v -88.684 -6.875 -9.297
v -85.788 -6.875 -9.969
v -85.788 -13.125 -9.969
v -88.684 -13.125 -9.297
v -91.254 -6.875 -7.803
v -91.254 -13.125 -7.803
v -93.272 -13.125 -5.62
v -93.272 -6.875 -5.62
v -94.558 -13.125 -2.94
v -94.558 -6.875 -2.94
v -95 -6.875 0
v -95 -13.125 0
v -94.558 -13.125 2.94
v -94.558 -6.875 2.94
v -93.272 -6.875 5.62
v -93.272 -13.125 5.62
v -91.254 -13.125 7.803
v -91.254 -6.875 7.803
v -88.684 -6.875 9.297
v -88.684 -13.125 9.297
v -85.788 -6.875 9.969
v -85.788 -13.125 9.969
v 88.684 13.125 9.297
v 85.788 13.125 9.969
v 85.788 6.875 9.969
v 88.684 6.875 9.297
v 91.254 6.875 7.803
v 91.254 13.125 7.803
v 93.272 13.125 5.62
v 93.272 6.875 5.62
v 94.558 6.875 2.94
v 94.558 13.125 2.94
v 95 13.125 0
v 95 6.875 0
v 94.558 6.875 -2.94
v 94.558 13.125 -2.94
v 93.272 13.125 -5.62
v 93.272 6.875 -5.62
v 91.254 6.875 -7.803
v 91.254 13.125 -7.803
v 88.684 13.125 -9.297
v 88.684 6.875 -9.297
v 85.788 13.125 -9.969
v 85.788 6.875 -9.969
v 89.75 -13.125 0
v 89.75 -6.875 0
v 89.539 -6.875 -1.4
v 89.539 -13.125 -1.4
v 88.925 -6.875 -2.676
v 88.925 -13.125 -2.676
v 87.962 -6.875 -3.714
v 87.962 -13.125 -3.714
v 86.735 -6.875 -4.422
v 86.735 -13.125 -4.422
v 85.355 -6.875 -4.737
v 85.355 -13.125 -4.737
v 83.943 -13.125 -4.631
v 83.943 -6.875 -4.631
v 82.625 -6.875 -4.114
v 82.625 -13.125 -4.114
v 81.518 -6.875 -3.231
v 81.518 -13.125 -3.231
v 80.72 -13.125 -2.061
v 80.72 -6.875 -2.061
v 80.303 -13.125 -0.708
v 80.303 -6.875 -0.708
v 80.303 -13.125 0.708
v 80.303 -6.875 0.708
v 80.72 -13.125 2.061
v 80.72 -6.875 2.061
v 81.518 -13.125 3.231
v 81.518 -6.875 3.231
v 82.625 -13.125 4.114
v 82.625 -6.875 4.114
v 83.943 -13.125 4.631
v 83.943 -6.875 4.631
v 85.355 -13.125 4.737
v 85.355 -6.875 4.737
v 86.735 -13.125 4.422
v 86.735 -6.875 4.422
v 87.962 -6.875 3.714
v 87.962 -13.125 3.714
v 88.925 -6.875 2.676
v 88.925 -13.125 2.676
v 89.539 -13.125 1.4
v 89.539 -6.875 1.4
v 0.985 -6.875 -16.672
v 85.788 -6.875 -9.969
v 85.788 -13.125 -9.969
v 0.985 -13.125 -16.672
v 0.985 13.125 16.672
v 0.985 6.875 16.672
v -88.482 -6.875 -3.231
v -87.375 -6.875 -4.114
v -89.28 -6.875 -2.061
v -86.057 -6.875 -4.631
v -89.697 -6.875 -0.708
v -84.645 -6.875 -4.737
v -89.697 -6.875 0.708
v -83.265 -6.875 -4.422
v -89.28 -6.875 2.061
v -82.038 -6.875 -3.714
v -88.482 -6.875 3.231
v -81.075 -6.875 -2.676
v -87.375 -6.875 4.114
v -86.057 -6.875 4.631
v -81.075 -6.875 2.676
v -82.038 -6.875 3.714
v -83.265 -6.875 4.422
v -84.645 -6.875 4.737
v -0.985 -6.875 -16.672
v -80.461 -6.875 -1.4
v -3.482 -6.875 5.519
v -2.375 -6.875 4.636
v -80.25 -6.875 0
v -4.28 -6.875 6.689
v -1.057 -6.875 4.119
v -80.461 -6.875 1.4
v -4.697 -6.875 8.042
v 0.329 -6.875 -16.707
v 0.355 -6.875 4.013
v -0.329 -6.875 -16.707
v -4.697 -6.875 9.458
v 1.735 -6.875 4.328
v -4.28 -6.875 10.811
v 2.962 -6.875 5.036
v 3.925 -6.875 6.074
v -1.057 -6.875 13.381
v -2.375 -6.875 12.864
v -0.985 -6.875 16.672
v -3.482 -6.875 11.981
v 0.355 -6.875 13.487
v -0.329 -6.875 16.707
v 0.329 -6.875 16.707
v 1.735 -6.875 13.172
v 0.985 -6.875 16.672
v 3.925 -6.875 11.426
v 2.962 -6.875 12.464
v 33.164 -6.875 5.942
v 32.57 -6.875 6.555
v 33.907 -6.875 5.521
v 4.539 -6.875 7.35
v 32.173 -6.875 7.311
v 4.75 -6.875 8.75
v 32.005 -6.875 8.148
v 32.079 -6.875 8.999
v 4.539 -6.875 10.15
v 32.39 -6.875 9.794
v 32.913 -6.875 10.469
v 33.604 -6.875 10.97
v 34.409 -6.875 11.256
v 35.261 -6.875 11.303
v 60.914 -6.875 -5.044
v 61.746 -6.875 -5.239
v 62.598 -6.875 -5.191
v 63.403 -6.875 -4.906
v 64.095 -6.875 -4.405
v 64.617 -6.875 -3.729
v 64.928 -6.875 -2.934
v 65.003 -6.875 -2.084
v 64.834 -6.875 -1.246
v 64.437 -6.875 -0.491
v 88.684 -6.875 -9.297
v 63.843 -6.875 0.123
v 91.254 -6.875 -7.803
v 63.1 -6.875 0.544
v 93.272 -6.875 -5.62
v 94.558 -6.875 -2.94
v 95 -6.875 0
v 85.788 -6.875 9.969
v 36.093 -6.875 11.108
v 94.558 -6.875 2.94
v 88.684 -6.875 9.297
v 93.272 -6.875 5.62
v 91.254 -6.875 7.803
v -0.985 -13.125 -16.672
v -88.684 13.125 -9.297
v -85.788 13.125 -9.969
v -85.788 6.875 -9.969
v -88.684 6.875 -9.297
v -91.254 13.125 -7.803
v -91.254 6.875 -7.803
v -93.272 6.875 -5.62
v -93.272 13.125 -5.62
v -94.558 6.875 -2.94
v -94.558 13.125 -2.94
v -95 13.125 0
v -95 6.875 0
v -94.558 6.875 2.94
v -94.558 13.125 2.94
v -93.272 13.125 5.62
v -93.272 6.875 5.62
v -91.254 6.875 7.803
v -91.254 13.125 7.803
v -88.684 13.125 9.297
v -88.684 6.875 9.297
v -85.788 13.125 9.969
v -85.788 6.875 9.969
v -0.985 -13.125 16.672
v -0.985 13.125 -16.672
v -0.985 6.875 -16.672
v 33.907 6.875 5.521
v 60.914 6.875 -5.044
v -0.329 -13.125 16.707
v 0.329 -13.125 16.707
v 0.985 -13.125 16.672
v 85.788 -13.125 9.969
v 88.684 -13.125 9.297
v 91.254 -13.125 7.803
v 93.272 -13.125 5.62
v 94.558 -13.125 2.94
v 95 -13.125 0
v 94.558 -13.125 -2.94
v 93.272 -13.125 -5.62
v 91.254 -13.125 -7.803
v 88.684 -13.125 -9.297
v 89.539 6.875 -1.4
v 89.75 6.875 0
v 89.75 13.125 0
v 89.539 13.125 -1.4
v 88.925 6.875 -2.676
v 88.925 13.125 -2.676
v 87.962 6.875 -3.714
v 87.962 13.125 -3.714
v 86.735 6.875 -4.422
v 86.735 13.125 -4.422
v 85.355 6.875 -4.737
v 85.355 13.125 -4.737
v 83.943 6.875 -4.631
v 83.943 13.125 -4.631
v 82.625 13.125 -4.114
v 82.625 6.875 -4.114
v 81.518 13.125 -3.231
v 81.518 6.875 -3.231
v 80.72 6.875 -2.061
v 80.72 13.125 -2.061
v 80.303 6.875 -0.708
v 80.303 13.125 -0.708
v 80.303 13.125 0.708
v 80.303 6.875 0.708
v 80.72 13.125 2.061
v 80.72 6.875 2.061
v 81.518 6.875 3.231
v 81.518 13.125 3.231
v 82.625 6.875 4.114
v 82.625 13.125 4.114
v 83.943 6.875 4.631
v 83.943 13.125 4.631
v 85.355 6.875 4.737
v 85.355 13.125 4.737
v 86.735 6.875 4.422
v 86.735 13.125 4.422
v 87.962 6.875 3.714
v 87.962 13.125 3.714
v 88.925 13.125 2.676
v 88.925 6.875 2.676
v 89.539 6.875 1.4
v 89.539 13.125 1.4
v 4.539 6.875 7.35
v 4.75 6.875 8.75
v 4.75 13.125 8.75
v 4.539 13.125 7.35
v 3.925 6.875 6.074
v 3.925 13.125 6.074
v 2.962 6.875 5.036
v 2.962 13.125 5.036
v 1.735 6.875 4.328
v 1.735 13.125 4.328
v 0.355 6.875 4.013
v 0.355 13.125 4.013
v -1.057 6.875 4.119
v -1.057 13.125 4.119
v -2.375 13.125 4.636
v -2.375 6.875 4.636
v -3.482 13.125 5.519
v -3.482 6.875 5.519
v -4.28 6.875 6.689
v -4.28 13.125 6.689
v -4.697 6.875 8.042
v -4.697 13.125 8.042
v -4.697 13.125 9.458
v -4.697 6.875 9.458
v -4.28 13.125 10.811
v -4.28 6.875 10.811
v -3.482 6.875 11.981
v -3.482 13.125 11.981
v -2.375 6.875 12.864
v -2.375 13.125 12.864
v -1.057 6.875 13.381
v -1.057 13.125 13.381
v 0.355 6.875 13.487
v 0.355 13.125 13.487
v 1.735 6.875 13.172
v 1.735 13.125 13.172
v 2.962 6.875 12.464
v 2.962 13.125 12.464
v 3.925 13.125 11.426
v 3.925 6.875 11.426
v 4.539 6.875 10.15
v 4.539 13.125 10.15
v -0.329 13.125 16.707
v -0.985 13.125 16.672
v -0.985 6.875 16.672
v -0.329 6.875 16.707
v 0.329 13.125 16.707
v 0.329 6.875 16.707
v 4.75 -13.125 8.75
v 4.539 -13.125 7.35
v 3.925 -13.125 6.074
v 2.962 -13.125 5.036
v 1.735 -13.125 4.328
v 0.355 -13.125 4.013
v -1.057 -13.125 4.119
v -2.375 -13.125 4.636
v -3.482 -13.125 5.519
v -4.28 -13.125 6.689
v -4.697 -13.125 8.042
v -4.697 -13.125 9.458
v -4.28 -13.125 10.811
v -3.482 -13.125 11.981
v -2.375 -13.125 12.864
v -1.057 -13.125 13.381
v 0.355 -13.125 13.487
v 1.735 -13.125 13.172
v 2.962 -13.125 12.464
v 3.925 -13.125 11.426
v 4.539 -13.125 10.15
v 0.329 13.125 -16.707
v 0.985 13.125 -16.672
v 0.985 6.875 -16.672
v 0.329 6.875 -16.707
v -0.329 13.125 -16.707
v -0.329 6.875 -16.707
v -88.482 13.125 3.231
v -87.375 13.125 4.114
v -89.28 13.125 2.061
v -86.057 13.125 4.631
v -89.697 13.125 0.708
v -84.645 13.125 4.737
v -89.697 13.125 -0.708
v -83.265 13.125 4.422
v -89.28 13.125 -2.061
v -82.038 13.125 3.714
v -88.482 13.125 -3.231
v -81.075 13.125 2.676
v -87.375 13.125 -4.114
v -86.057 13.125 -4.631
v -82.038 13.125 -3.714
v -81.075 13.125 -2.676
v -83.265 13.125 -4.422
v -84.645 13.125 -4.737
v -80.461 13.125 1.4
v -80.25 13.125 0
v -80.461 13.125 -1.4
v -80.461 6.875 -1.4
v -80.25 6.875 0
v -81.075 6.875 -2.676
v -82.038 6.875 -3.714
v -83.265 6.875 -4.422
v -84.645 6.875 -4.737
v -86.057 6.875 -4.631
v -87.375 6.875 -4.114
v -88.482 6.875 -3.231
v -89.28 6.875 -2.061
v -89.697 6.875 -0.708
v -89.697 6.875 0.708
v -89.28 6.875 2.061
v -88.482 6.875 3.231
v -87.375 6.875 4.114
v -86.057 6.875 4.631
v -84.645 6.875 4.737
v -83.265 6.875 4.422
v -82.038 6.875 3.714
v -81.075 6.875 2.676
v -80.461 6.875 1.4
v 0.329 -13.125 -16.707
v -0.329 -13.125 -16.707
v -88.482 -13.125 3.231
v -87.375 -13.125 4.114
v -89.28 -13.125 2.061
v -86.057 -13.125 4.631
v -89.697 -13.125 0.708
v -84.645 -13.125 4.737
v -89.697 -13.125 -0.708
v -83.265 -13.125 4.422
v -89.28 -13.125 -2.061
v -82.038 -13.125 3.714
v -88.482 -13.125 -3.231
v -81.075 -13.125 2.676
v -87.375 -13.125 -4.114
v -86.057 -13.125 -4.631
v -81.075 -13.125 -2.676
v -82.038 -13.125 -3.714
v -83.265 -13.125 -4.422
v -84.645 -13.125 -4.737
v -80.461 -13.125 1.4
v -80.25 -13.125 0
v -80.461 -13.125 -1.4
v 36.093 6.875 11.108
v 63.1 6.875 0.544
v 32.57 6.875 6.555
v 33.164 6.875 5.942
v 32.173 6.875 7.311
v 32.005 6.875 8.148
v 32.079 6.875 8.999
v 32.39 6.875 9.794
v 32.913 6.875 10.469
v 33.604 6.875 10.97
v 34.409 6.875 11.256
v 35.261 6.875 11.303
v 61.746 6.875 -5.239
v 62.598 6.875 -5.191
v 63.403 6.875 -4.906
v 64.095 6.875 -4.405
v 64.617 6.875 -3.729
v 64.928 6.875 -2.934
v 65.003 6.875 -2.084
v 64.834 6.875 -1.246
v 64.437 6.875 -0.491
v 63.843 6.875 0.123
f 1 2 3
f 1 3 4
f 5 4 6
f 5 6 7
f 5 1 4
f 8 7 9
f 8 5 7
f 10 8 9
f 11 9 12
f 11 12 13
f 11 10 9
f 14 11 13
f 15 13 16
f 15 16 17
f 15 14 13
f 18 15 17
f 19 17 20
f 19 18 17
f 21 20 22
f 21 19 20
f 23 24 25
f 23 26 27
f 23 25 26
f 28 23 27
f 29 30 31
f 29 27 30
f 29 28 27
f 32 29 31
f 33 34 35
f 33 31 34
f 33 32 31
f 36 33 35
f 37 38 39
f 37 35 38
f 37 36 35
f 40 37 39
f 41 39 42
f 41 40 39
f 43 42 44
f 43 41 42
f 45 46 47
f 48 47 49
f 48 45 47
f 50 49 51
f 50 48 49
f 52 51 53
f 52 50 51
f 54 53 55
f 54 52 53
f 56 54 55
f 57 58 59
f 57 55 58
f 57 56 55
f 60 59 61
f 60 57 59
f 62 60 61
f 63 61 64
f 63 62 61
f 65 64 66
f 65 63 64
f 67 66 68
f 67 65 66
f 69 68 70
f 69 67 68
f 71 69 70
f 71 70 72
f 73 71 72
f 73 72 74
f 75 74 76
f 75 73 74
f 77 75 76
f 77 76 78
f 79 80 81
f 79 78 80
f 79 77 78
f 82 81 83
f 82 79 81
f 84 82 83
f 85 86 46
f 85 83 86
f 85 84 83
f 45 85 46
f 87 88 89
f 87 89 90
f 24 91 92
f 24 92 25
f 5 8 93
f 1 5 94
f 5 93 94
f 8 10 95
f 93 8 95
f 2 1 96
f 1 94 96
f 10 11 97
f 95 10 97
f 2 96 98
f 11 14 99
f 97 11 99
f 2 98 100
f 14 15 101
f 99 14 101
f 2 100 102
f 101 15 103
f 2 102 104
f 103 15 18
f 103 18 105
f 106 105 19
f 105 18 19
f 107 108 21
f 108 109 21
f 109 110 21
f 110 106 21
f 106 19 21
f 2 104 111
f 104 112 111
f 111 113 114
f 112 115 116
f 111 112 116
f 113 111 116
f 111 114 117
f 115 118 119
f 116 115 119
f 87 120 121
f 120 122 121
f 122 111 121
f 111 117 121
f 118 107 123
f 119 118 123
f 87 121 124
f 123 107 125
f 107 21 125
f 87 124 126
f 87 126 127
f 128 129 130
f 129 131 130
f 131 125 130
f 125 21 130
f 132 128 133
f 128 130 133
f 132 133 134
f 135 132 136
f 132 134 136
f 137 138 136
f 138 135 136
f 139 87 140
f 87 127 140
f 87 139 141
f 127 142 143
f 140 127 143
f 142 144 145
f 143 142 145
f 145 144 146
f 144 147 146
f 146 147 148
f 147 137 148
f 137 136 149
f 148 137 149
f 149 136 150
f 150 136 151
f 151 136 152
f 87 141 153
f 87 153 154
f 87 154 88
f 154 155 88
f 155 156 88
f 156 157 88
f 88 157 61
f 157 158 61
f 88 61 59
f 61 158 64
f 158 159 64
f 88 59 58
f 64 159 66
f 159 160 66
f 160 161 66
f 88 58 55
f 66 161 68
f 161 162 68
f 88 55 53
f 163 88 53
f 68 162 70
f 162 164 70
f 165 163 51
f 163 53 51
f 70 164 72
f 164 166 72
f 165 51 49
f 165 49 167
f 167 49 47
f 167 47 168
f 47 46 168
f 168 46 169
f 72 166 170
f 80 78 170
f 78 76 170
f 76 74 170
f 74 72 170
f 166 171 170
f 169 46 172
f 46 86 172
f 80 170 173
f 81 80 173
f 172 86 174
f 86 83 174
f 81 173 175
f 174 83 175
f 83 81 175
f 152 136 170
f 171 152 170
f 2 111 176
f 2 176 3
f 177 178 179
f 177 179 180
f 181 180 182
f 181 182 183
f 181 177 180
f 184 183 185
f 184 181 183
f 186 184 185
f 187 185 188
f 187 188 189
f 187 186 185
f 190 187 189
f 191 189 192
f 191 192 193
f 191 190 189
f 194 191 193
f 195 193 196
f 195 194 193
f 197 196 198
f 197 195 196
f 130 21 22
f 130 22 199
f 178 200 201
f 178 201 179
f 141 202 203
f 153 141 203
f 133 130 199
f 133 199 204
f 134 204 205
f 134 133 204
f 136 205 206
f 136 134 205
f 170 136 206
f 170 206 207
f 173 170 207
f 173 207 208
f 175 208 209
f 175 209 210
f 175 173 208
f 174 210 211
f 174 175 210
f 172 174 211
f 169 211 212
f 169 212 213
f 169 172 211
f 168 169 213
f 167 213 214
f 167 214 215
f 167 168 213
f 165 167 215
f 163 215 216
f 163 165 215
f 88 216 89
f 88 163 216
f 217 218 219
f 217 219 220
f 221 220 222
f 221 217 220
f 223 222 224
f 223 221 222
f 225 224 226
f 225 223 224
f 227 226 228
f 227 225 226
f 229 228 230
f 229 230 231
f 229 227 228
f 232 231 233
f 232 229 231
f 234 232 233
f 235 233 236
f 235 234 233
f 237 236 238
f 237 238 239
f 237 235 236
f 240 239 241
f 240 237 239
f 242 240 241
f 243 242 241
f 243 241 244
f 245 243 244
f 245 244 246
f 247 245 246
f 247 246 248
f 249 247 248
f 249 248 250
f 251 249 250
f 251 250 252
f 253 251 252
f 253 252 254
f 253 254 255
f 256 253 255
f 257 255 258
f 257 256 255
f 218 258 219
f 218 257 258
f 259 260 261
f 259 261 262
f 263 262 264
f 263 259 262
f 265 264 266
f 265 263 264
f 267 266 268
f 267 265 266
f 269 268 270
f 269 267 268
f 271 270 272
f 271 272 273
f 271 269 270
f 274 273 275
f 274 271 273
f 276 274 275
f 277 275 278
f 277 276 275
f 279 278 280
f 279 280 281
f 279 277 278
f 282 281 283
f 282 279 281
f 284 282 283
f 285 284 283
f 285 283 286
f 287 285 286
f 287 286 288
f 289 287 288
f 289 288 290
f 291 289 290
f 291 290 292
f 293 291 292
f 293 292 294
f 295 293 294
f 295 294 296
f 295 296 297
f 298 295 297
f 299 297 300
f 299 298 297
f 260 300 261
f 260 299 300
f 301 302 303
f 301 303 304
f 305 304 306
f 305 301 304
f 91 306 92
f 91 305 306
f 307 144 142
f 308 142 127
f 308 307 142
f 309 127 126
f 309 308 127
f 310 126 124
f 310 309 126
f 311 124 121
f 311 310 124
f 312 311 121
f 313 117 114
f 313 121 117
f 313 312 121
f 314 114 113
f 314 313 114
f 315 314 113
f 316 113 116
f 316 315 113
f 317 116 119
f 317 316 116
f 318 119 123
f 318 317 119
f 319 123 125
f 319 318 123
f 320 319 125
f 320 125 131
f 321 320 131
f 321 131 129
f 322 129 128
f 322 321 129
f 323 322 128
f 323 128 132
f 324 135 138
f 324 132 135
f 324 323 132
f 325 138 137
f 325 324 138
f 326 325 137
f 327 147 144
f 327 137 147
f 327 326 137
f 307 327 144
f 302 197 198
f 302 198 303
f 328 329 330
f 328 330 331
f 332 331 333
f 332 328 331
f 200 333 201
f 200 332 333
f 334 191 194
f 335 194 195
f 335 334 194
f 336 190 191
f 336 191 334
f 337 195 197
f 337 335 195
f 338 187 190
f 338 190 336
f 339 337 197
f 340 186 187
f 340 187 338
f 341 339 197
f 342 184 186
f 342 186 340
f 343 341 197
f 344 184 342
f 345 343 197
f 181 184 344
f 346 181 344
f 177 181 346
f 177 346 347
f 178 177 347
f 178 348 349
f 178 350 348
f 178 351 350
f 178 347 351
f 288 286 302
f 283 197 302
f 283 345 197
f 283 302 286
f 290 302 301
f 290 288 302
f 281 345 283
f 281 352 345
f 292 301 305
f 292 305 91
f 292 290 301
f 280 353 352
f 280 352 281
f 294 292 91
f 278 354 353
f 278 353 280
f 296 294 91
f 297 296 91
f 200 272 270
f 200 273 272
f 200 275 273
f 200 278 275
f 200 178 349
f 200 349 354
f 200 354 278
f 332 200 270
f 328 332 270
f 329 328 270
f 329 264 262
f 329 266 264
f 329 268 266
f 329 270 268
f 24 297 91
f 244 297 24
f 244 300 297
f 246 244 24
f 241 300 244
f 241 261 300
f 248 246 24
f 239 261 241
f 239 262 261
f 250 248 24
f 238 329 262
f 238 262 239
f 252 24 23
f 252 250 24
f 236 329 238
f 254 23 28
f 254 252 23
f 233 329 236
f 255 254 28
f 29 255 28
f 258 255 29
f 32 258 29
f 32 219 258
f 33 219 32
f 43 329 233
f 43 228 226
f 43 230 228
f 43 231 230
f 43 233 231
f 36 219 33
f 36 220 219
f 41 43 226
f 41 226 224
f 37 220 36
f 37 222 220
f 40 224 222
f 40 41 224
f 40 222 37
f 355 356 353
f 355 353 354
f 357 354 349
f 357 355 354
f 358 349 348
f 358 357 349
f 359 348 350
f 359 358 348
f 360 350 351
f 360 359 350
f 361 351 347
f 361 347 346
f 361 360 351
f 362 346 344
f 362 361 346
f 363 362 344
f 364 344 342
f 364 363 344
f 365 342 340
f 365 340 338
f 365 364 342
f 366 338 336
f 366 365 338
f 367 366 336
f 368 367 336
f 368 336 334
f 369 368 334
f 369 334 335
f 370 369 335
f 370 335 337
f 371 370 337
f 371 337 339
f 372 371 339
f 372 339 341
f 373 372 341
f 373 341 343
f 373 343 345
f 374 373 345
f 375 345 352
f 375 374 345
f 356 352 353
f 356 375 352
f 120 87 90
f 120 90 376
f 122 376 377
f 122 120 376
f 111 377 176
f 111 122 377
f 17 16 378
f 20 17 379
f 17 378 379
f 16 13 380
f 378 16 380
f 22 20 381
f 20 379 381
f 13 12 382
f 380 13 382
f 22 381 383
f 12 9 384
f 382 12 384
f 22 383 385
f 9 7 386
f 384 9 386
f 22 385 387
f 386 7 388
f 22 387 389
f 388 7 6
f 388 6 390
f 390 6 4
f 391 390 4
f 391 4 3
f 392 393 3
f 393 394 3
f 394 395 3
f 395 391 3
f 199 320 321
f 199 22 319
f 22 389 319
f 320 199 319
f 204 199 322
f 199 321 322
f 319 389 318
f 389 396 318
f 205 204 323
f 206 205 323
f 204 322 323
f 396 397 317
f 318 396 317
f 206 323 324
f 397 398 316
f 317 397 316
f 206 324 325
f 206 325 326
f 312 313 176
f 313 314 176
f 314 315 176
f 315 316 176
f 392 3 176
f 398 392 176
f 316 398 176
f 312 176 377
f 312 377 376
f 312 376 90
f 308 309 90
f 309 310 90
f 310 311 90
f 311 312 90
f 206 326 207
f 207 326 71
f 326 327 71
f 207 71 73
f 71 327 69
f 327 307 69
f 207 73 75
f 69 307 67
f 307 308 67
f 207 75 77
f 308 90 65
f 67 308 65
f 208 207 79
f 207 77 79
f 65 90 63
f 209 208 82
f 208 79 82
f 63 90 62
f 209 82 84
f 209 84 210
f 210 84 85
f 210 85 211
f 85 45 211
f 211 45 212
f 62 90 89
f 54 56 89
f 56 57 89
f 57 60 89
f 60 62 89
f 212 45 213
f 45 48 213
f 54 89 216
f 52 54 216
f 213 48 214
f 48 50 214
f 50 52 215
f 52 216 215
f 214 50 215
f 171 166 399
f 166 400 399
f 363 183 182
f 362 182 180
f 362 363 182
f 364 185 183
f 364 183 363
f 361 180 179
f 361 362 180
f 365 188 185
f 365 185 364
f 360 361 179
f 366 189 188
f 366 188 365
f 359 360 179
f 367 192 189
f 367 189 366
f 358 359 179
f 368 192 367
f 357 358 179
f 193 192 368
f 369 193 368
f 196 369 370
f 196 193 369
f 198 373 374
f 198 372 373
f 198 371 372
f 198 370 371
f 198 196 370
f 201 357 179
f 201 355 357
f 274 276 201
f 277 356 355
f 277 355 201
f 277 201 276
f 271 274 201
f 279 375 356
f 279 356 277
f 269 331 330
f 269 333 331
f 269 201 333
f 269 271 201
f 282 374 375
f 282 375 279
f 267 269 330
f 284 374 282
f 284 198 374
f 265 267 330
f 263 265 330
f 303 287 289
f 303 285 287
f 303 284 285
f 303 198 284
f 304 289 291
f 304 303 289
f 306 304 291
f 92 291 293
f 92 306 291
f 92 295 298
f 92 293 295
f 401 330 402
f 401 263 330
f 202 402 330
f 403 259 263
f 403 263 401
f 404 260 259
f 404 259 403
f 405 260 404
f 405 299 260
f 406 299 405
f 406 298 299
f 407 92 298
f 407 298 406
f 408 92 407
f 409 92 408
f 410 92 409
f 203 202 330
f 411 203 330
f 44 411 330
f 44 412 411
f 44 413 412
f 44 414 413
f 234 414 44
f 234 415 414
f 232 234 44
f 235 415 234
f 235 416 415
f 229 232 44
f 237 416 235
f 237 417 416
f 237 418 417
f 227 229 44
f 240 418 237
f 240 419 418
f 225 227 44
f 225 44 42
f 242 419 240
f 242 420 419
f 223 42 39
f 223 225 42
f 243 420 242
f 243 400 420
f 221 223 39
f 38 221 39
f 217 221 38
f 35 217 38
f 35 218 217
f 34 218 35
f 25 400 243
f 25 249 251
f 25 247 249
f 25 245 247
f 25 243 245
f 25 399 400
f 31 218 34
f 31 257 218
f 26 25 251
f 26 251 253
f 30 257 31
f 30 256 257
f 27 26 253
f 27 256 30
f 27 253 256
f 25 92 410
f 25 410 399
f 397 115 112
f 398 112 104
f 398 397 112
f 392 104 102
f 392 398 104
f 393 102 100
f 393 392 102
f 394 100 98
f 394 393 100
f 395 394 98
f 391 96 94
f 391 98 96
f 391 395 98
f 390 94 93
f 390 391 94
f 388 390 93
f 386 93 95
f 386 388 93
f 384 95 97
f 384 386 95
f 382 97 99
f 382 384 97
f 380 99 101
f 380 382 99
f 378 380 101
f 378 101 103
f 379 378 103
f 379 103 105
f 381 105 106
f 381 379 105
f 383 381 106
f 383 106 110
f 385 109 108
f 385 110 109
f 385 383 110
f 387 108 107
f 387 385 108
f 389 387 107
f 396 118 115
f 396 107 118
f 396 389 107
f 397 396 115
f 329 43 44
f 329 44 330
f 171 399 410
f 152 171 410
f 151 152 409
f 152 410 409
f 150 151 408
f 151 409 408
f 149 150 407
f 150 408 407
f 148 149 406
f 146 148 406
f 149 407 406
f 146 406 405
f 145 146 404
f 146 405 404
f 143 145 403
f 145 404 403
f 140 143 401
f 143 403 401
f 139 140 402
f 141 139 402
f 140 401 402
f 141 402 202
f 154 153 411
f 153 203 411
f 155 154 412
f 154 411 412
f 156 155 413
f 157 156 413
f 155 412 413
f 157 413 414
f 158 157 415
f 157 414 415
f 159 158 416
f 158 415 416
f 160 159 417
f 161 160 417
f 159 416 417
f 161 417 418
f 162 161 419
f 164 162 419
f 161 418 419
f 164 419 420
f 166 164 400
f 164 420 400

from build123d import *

# Parameters (mm, degrees)
SKETCH1_R                = 4.75
BOSS_EXTRUDE1_DEPTH      = 13.125
SKETCH2_W                = 190
SKETCH2_H                = 13.75
CUT_EXTRUDE1_DEPTH       = 34.711010303
BOSS_EXTRUDE4_DEPTH      = 6.875
BOSS_EXTRUDE4_DEPTH_BACK = 6.875


with BuildPart() as part:
    # Sketch1 → Boss-Extrude1 (new body, symmetric)
    with BuildSketch(Plane(origin=(0, 0, 0), x_dir=(1, 0, 0), z_dir=(0, 1, 0))):
        with BuildLine():
            Line((-0.984987686, 16.672141843), (-85.787990149, 9.968905232))
            ThreePointArc((-85.787990149, 9.968905232), (-95, 0), (-85.787990149, -9.968905232))
            Line((-85.787990149, -9.968905232), (-0.984987686, -16.672141843))
            ThreePointArc((-0.984987686, -16.672141843), (0, -16.711010303), (0.984987686, -16.672141843))
            Line((0.984987686, -16.672141843), (85.787990149, -9.968905232))
            ThreePointArc((85.787990149, -9.968905232), (95, 0), (85.787990149, 9.968905232))
            Line((85.787990149, 9.968905232), (0.984987686, 16.672141843))
            ThreePointArc((0.984987686, 16.672141843), (0, 16.711010303), (-0.984987686, 16.672141843))
        make_face()
        with Locations((-85, 0)):
            Circle(SKETCH1_R, mode=Mode.SUBTRACT)
        with Locations((85, 0)):
            Circle(SKETCH1_R, mode=Mode.SUBTRACT)
        with Locations((0, -8.75)):
            Circle(SKETCH1_R, mode=Mode.SUBTRACT)
    extrude(amount=BOSS_EXTRUDE1_DEPTH, both=True)

    # Sketch2 → Cut-Extrude1 (cut, through all)
    with BuildSketch(Plane.XY.offset(17)):
        Rectangle(SKETCH2_W, SKETCH2_H)
    extrude(amount=-CUT_EXTRUDE1_DEPTH, mode=Mode.SUBTRACT)

    # Sketch3 → Boss-Extrude4 (add, two sides)
    with BuildSketch(Plane(origin=(0, 0, 0), x_dir=(1, 0, 0), z_dir=(0, 1, 0))) as boss_extrude4_sk:
        with BuildLine():
            Line((33.907114097, -5.520713265), (60.914335229, 5.043850462))
            ThreePointArc((60.914335229, 5.043850462), (64.801071594, 3.342885903), (63.100107035, -0.543850462))
            Line((63.100107035, -0.543850462), (36.092885903, -11.108414189))
            ThreePointArc((36.092885903, -11.108414189), (32.206149538, -9.40744963), (33.907114097, -5.520713265))
        make_face()
    extrude(amount=BOSS_EXTRUDE4_DEPTH)
    extrude(boss_extrude4_sk.sketch, amount=-BOSS_EXTRUDE4_DEPTH_BACK)


solid = part.part
